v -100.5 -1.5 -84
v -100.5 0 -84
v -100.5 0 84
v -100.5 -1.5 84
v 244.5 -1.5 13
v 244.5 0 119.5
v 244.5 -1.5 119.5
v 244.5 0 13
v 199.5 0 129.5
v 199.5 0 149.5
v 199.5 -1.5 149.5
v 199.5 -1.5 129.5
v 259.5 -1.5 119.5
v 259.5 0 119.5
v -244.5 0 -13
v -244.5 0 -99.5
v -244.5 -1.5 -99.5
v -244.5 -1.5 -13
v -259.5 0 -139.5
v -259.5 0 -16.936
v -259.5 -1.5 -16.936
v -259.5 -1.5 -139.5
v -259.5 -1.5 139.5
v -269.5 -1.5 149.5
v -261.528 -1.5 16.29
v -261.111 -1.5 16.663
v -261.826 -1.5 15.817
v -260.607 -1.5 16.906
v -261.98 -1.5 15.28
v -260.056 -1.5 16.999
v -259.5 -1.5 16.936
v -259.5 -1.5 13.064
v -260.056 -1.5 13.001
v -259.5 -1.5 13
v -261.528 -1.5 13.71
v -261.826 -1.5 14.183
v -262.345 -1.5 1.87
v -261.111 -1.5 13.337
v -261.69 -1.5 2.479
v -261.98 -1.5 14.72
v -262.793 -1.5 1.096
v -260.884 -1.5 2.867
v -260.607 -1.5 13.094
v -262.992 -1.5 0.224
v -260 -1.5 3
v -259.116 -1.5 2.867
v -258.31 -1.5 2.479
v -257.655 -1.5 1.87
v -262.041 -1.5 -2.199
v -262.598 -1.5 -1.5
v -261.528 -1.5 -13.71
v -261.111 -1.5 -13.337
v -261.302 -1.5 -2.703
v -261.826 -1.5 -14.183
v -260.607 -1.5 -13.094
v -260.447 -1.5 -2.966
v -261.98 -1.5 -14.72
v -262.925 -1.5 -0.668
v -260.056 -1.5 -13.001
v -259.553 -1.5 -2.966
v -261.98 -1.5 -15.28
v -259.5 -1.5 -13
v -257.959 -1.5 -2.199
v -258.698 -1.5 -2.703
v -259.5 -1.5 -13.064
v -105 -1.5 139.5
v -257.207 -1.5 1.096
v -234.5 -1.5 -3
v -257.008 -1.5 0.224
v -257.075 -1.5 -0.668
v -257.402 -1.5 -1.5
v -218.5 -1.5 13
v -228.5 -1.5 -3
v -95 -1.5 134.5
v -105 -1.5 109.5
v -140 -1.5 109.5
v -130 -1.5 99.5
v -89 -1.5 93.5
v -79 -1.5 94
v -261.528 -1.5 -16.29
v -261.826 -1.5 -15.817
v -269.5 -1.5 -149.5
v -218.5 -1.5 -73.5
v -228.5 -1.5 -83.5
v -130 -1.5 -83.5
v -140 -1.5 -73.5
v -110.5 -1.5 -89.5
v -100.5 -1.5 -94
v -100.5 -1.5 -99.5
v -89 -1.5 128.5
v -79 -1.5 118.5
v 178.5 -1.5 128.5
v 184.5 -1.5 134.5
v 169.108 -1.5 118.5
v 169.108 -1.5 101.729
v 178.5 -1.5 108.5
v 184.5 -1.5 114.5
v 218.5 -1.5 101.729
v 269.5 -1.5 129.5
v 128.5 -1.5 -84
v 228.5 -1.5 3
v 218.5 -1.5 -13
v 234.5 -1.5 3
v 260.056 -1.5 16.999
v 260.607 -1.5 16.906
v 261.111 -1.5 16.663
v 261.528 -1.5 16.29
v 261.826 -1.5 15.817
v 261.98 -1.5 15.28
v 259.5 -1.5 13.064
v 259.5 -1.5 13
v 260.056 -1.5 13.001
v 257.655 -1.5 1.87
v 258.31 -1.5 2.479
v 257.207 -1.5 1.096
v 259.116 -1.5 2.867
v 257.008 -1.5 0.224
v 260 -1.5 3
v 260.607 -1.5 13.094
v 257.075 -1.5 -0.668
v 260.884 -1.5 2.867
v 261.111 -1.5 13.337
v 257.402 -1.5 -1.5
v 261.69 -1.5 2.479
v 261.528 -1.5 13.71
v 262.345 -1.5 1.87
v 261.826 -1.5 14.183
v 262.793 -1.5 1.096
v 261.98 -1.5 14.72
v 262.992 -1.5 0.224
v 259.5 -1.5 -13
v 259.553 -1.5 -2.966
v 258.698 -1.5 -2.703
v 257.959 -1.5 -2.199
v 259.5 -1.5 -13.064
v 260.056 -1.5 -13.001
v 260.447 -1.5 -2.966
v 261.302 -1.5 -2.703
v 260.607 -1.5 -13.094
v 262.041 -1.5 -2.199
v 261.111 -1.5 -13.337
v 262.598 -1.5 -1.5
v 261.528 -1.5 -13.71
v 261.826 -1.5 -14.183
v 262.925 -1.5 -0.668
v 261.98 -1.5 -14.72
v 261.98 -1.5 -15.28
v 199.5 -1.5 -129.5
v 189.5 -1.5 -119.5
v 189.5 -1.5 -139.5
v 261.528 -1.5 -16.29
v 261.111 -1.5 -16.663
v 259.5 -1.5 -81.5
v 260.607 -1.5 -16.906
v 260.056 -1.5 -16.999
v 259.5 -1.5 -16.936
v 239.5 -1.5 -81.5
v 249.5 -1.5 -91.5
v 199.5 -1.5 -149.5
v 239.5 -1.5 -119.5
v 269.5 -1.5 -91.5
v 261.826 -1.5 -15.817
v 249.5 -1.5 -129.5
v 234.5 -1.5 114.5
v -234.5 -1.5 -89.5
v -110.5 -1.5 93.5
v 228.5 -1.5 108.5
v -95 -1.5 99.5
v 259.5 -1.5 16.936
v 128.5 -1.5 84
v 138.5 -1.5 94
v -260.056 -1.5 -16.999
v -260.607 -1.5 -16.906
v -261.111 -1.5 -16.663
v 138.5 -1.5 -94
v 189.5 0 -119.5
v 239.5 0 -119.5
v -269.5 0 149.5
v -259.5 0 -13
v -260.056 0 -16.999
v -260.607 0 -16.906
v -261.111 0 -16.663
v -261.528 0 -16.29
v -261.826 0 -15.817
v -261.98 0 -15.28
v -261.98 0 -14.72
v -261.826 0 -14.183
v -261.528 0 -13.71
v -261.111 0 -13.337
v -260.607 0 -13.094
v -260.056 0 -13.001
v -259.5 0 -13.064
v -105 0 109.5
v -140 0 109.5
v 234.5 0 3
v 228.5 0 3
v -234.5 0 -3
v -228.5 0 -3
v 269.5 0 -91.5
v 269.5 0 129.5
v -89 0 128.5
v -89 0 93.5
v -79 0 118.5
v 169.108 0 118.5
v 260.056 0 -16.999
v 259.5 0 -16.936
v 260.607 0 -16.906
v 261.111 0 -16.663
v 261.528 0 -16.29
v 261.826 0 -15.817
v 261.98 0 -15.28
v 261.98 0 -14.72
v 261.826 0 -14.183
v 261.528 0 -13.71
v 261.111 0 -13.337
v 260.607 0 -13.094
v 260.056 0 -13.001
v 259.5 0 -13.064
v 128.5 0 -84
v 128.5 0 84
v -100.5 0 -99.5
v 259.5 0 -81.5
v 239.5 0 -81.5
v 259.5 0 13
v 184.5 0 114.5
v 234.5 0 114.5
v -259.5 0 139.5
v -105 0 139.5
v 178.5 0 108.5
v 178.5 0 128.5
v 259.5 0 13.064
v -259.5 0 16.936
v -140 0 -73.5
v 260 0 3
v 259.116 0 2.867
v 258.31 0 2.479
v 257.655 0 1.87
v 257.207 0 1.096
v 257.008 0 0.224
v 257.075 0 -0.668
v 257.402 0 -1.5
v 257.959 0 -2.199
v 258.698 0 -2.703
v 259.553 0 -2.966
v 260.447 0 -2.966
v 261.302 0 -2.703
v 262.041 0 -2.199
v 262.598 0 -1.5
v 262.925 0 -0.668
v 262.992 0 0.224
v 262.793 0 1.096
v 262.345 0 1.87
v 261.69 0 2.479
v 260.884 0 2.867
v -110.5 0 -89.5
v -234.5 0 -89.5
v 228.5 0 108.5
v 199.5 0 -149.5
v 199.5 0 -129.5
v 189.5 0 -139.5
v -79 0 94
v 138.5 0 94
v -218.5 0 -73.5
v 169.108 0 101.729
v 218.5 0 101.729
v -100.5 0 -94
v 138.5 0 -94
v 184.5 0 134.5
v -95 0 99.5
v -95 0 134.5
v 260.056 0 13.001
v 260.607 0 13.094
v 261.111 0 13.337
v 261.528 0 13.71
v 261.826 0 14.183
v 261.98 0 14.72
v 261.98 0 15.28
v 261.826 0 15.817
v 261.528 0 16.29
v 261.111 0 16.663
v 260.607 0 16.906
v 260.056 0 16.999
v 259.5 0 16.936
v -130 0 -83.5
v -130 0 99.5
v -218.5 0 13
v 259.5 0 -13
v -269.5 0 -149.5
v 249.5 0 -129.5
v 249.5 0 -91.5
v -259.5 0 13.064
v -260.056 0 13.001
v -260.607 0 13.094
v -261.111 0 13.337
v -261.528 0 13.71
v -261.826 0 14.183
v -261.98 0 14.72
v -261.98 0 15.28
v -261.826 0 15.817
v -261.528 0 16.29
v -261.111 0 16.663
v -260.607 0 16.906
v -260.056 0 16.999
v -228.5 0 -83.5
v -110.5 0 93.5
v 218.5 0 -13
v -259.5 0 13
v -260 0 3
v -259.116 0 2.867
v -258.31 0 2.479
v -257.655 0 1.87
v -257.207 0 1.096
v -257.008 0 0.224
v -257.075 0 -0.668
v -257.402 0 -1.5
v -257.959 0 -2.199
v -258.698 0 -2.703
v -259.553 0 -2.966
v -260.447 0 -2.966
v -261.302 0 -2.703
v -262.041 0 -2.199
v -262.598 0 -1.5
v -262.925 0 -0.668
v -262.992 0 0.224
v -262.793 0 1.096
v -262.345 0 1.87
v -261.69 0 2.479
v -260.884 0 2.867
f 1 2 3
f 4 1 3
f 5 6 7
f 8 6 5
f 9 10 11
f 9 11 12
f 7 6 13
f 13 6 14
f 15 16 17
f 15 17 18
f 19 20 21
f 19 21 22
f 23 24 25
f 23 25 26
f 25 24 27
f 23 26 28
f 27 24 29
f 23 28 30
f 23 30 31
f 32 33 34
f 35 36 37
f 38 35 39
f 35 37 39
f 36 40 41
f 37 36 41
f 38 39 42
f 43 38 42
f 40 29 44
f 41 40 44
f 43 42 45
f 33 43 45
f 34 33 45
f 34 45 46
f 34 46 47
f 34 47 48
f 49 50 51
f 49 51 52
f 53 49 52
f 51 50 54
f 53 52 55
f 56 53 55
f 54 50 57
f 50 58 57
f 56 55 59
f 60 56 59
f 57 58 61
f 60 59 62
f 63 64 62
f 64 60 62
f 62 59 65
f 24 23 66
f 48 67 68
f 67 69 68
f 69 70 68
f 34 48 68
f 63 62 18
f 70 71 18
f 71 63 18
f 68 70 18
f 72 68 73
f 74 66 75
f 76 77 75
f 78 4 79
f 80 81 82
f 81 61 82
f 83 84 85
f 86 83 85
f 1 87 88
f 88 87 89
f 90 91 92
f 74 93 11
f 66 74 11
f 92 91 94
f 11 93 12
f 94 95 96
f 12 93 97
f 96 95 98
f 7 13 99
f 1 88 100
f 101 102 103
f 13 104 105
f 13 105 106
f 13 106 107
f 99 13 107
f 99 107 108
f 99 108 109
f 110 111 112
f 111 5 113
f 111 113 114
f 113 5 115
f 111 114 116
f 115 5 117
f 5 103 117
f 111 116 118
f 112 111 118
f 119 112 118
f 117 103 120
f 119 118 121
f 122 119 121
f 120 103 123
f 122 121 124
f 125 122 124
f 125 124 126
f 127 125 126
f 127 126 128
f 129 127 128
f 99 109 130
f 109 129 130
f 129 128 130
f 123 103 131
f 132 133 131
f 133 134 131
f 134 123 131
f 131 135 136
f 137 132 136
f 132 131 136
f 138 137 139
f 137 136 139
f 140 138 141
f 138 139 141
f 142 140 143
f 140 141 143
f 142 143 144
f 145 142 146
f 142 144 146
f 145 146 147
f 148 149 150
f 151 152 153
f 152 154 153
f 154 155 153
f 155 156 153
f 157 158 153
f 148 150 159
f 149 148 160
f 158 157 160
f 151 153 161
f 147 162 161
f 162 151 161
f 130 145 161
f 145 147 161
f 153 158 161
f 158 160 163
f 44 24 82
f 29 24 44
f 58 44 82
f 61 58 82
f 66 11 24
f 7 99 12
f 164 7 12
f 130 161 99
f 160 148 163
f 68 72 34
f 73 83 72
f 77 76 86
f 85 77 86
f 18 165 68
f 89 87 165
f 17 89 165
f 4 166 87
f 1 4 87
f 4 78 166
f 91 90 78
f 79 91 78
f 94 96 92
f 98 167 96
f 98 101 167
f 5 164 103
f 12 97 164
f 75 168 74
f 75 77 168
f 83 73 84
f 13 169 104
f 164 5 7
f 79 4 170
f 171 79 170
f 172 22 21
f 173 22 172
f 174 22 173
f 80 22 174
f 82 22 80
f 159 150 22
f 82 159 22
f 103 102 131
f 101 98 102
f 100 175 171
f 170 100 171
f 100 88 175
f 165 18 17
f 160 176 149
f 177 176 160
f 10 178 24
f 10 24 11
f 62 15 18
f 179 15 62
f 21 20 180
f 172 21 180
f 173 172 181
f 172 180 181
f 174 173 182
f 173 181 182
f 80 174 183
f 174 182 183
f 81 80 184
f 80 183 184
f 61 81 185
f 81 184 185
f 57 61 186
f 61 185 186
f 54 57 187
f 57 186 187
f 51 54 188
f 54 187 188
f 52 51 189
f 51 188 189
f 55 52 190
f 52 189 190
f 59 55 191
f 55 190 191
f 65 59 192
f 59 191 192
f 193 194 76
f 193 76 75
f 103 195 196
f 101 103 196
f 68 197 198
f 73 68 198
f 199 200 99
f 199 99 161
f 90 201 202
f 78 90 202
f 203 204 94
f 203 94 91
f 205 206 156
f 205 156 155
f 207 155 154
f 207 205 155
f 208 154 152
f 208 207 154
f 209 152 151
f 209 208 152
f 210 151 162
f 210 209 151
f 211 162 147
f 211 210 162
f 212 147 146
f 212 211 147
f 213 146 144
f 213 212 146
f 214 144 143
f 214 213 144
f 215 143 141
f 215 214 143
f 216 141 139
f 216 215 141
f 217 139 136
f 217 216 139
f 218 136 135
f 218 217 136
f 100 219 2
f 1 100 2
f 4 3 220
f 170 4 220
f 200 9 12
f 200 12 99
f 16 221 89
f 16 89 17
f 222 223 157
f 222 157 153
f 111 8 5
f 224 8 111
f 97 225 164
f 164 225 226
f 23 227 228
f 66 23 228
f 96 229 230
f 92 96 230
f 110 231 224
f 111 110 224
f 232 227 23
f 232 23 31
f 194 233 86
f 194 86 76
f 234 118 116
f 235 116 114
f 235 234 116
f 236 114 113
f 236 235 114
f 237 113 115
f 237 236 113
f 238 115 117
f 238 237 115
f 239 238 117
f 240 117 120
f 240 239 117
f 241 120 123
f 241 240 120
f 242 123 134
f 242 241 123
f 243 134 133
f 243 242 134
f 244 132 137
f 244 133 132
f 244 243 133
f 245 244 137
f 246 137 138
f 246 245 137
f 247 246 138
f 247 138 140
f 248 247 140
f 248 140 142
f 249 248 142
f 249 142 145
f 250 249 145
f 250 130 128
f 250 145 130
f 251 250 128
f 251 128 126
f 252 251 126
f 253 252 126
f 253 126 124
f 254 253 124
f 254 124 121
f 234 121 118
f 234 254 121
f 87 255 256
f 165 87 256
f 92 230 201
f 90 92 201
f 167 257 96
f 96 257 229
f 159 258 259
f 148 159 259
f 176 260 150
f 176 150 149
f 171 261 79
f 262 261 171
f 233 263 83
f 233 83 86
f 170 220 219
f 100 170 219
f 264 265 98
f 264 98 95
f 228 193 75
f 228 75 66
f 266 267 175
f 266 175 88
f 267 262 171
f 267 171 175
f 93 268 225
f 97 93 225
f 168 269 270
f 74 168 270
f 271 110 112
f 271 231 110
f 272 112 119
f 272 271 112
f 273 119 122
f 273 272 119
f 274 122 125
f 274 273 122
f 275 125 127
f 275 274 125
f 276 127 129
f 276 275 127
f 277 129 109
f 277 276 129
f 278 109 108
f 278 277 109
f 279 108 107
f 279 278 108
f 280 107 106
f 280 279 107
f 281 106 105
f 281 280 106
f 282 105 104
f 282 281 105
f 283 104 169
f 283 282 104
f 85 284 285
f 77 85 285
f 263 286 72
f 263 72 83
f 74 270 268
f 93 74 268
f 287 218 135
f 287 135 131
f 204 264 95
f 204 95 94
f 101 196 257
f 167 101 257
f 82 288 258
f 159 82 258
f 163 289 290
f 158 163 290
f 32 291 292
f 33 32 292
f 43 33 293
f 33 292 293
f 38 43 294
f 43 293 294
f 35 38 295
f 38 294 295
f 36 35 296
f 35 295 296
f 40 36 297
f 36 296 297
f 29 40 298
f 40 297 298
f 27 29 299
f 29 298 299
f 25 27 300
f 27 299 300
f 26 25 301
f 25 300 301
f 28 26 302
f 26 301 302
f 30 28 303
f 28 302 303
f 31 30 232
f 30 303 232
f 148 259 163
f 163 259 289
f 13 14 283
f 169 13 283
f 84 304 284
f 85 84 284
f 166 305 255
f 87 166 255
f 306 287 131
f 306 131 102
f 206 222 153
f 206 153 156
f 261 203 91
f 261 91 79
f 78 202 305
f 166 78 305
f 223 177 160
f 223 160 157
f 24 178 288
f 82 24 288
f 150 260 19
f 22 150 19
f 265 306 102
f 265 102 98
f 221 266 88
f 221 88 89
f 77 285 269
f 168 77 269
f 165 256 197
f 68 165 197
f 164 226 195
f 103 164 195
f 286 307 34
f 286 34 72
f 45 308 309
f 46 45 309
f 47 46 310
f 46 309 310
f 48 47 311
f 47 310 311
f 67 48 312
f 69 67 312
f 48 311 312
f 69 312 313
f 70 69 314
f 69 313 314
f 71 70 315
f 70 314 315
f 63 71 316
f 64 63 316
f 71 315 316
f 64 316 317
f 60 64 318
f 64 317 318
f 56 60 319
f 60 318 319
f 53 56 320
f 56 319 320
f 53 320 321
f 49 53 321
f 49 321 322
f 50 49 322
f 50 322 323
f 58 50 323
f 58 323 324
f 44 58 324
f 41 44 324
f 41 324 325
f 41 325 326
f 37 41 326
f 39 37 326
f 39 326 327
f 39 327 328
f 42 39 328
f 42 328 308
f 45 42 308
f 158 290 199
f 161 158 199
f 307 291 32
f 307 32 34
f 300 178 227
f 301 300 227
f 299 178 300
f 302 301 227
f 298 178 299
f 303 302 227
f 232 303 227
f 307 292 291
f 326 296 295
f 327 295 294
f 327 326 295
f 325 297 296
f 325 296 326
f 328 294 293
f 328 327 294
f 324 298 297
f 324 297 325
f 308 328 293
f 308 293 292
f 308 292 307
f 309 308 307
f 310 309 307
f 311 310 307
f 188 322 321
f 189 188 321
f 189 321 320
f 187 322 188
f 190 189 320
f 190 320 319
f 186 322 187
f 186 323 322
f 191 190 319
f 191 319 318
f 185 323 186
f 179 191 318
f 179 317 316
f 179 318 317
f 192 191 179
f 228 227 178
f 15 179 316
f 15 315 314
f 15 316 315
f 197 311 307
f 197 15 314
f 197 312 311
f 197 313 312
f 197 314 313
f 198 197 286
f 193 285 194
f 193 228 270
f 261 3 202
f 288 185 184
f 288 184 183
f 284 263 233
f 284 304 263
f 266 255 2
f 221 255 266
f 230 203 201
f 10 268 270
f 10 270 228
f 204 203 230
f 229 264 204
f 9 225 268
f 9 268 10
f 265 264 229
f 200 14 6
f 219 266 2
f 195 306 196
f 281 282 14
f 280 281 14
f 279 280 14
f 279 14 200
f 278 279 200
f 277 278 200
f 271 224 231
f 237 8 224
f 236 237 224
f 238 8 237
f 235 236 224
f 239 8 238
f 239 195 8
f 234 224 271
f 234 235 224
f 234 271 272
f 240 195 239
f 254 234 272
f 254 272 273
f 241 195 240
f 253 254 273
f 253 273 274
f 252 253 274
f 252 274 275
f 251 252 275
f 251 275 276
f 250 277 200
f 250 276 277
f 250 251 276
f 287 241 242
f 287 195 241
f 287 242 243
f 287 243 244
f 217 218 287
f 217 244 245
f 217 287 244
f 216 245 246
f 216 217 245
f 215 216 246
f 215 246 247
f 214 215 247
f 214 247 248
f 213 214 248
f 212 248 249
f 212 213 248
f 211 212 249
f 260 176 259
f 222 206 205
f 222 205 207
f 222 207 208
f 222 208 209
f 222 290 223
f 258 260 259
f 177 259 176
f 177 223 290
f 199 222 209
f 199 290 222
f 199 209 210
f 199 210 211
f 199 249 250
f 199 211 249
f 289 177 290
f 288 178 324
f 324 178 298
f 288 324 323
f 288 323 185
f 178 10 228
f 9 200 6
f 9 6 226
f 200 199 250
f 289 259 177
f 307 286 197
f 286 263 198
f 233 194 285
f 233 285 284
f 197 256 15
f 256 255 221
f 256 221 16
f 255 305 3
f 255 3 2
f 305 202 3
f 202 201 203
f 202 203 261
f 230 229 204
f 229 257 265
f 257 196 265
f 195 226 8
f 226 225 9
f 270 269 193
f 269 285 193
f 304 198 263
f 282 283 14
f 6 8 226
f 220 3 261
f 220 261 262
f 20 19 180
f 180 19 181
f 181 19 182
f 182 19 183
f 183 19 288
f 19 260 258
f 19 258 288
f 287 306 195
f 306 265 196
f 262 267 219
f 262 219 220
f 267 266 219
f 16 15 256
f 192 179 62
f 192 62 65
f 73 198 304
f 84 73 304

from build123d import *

# Parameters (mm, degrees)
SKETCH1_W           = 539
SKETCH1_H           = 299
BOSS_EXTRUDE1_DEPTH = 1.5
SKETCH10_W          = 70
SKETCH10_H          = 20
CUT_EXTRUDE6_DEPTH  = 309.192715683
SKETCH2_R           = 3
SKETCH2_R_2         = 2
CUT_EXTRUDE1_DEPTH  = 10
CUT_EXTRUDE3_DEPTH  = 309.192715683
CUT_EXTRUDE5_DEPTH  = 309.192715683
SKETCH7_W           = 15
SKETCH7_H           = 106.5
CUT_EXTRUDE4_DEPTH  = 309.192715683


with BuildPart() as part:
    # Sketch1 → Boss-Extrude1 (new body)
    with BuildSketch(Plane(origin=(0, 0, 0), x_dir=(1, 0, 0), z_dir=(0, 1, 0))):
        Rectangle(SKETCH1_W, SKETCH1_H)
    extrude(amount=-BOSS_EXTRUDE1_DEPTH)

    # Sketch10 → Cut-Extrude6 (cut, through all)
    with BuildSketch(Plane(origin=(0, 0, 0), x_dir=(1, 0, 0), z_dir=(0, 1, 0))):
        Polygon((269.5, 149.5), (199.5, 149.5), (199.5, 129.5), (249.5, 129.5), (249.5, 91.5), (269.5, 91.5), align=None)
        with Locations((234.5, -139.5)):
            Rectangle(SKETCH10_W, SKETCH10_H)
    extrude(amount=-CUT_EXTRUDE6_DEPTH, mode=Mode.SUBTRACT)

    # Sketch2 → Cut-Extrude1 (cut)
    with BuildSketch(Plane(origin=(0, 0, 0), x_dir=(1, 0, 0), z_dir=(0, 1, 0))):
        with Locations(Location((-260, 0, 0), (0, 0, 270))):
            Circle(SKETCH2_R)
        with Locations(Location((-260, 15, 0), (0, 0, 270))):
            Circle(SKETCH2_R_2)
        with Locations(Location((-260, -15, 0), (0, 0, 270))):
            Circle(SKETCH2_R_2)
    cut_extrude1 = extrude(amount=-CUT_EXTRUDE1_DEPTH, mode=Mode.SUBTRACT)

    # Mirror1: Cut-Extrude1 across plane
    add(cut_extrude1.mirror(Plane(origin=(0, 0, 0), x_dir=(0, 0, 1), z_dir=(1, 0, 0))), mode=Mode.SUBTRACT)

    # Sketch5 → Cut-Extrude3 (cut, through all)
    with BuildSketch(Plane(origin=(0, 0, 0), x_dir=(1, 0, 0), z_dir=(0, 1, 0))):
        Polygon((-100.5, -62.4), (-100.5, -84), (128.5, -84), (128.5, 84), (-100.5, 84), align=None)
    extrude(amount=-CUT_EXTRUDE3_DEPTH, mode=Mode.SUBTRACT)

    # Sketch9 → Cut-Extrude5 (cut, through all)
    with BuildSketch(Plane(origin=(0, 0, 0), x_dir=(1, 0, 0), z_dir=(0, 1, 0))):
        Polygon((-234.5, 3), (-228.5, 3), (-228.5, 83.5), (-130, 83.5), (-130, -99.5), (-95, -99.5), (-95, -134.5), (184.5, -134.5), (184.5, -114.5), (234.5, -114.5), (234.5, -3), (228.5, -3), (228.5, -108.5), (178.5, -108.5), (178.5, -128.5), (-89, -128.5), (-89, -93.5), (-110.5, -93.5), (-110.5, 89.5), (-234.5, 89.5), align=None)
    extrude(amount=-CUT_EXTRUDE5_DEPTH, mode=Mode.SUBTRACT)

    # Sketch7 → Cut-Extrude4 (cut, through all)
    with BuildSketch(Plane(origin=(0, 0, 0), x_dir=(1, 0, 0), z_dir=(0, 1, 0))):
        Polygon((-259.5, -13), (-218.5, -13), (-218.5, 73.5), (-140, 73.5), (-140, -109.5), (-105, -109.5), (-105, -139.5), (-140, -139.5), (-259.5, -139.5), align=None)
        Polygon((-259.5, 139.5), (-244.5, 139.5), (-100.5, 139.5), (189.5, 139.5), (189.5, 119.5), (239.5, 119.5), (239.5, 81.5), (259.5, 81.5), (259.5, 13), (218.5, 13), (218.5, -101.728673951), (169.107799643, -101.728673951), (169.107799643, -118.5), (-79, -118.5), (-79, -94), (138.5, -94), (138.5, 94), (-100.5, 94), (-100.5, 99.5), (-244.5, 99.5), (-244.5, 13), (-259.5, 13), align=None)
        with Locations((252, -66.25)):
            Rectangle(SKETCH7_W, SKETCH7_H)
    extrude(amount=-CUT_EXTRUDE4_DEPTH, mode=Mode.SUBTRACT)


solid = part.part
